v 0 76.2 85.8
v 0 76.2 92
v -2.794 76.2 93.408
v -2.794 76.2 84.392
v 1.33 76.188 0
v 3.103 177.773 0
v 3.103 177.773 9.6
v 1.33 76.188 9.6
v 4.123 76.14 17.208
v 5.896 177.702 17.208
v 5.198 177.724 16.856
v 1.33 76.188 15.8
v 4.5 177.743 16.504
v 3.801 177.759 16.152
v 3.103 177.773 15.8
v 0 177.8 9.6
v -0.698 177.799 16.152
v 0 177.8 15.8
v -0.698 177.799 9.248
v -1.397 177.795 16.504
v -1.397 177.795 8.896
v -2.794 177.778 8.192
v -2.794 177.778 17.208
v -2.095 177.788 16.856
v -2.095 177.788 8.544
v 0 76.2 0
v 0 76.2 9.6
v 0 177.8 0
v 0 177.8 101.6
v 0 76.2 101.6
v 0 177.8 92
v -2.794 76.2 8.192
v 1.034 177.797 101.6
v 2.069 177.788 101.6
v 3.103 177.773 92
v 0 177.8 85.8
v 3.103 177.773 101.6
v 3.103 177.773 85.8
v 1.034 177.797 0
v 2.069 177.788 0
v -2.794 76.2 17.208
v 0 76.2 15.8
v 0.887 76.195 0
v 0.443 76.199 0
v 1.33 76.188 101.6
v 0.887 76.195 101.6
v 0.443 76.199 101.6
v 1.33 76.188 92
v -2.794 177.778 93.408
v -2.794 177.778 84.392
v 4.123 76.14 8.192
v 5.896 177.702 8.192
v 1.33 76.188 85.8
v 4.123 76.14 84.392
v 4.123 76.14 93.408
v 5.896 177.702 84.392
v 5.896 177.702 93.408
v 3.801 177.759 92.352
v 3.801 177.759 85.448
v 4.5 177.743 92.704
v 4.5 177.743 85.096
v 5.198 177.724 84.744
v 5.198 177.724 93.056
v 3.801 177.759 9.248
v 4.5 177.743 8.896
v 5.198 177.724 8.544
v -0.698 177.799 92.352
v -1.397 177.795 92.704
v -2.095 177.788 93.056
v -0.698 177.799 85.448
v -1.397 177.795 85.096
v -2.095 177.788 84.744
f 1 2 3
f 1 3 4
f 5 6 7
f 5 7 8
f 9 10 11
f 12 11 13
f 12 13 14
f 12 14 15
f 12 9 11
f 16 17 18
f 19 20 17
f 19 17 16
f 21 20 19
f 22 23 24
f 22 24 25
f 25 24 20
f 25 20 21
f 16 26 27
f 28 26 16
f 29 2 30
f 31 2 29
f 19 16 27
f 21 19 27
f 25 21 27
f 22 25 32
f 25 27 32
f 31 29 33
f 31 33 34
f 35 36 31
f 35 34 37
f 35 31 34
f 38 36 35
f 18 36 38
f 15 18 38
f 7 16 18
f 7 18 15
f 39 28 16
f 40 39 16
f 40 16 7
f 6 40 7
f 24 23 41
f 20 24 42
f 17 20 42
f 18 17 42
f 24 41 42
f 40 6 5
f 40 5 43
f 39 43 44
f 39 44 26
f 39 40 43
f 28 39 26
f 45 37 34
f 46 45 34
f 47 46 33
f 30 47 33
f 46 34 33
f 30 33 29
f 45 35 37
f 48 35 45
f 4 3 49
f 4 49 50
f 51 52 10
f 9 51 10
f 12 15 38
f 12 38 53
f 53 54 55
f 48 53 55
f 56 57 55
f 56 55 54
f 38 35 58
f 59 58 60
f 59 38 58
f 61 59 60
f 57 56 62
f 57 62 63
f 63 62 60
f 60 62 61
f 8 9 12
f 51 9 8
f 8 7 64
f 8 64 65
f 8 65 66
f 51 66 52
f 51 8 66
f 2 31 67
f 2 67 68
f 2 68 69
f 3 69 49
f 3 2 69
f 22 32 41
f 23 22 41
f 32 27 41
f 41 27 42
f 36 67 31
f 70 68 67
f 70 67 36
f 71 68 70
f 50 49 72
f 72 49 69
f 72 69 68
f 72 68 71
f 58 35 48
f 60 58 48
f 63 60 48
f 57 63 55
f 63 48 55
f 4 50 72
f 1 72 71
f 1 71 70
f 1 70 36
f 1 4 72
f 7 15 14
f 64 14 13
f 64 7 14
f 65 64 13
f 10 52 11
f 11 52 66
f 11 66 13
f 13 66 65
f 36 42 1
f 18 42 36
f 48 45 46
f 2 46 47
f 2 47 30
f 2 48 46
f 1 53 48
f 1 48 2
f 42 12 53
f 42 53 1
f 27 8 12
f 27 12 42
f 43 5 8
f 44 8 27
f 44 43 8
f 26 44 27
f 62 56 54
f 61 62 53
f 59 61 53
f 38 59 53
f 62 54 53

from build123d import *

# Parameters (mm, degrees)
BOSS_EXTRUDE1_DEPTH      = 101.6
BOSS_EXTRUDE2_REACH      = 145.703
BOSS_EXTRUDE2_END_RADIUS = 177.8
BOSS_EXTRUDE3_REACH      = 145.805
BOSS_EXTRUDE3_END_RADIUS = 177.8


with BuildPart() as part:
    # Sketch1 → Boss-Extrude1 (new body)
    with BuildSketch(Plane.XY):
        with BuildLine():
            Line((0, 76.2), (0, 177.8))
            ThreePointArc((0, 177.8), (1.551578012, 177.793229921), (3.103037865, 177.772920199))
            Line((3.103037865, 177.772920199), (1.329873371, 76.188394371))
            ThreePointArc((1.329873371, 76.188394371), (0.664962005, 76.197098537), (0, 76.2))
        make_face()
    extrude(amount=BOSS_EXTRUDE1_DEPTH)

    # Boss-Extrude2: up to this cylinder (the profile starts inside it)
    boss_extrude2_end = Plane(origin=(0, 0, 50.8), z_dir=(0, 0, -1)) * Cylinder(BOSS_EXTRUDE2_END_RADIUS, 724.206, mode=Mode.PRIVATE)
    # Sketch2 → Boss-Extrude2 (add, up to the surface)
    with BuildSketch(Plane(origin=(1.329873371, 76.188394371, 0), x_dir=(0, 0, -1), z_dir=(-0.01745240643728355, -0.9998476951563914, 0)), mode=Mode.PRIVATE) as boss_extrude2_sk1:
        Polygon((-92.000208065, 0), (-93.4085, 2.794), (-84.3915, 2.794), (-85.799791935, 0), align=None)
    boss_extrude2_tool1 = extrude(boss_extrude2_sk1.sketch, amount=-BOSS_EXTRUDE2_REACH, mode=Mode.PRIVATE) & boss_extrude2_end
    add(boss_extrude2_tool1.solids().sort_by_distance((2.812837, 76.162509, 88.9))[0])
    # Sketch2 → Boss-Extrude2 (add, up to the surface)
    with BuildSketch(Plane(origin=(1.329873371, 76.188394371, 0), x_dir=(0, 0, -1), z_dir=(-0.01745240643728355, -0.9998476951563914, 0)), mode=Mode.PRIVATE) as boss_extrude2_sk2:
        Polygon((-15.800208065, 0), (-9.599791935, 0), (-8.1915, 2.794), (-17.2085, 2.794), align=None)
    boss_extrude2_tool2 = extrude(boss_extrude2_sk2.sketch, amount=-BOSS_EXTRUDE2_REACH, mode=Mode.PRIVATE) & boss_extrude2_end
    add(boss_extrude2_tool2.solids().sort_by_distance((2.812837, 76.162509, 12.7))[0])

    # Boss-Extrude3: up to this cylinder (the profile starts inside it)
    boss_extrude3_end = Plane(origin=(0, 0, 50.8), z_dir=(0, 0, -1)) * Cylinder(BOSS_EXTRUDE3_END_RADIUS, 724.41, mode=Mode.PRIVATE)
    # Sketch3 → Boss-Extrude3 (add, up to the surface)
    with BuildSketch(Plane(origin=(0, 76.2, 0), x_dir=(0, 0, -1), z_dir=(0, -1, 0)), mode=Mode.PRIVATE) as boss_extrude3_sk1:
        Polygon((-92.000208065, 0), (-93.4085, -2.79357446), (-84.3915, -2.79357446), (-85.799791935, 0), align=None)
    boss_extrude3_tool1 = extrude(boss_extrude3_sk1.sketch, amount=-BOSS_EXTRUDE3_REACH, mode=Mode.PRIVATE) & boss_extrude3_end
    add(boss_extrude3_tool1.solids().sort_by_distance((-1.482964, 76.2, 88.9))[0])
    # Sketch3 → Boss-Extrude3 (add, up to the surface)
    with BuildSketch(Plane(origin=(0, 76.2, 0), x_dir=(0, 0, -1), z_dir=(0, -1, 0)), mode=Mode.PRIVATE) as boss_extrude3_sk2:
        Polygon((-15.800208065, 0), (-9.599791935, 0), (-8.1915, -2.79357446), (-17.2085, -2.79357446), align=None)
    boss_extrude3_tool2 = extrude(boss_extrude3_sk2.sketch, amount=-BOSS_EXTRUDE3_REACH, mode=Mode.PRIVATE) & boss_extrude3_end
    add(boss_extrude3_tool2.solids().sort_by_distance((-1.482964, 76.2, 12.7))[0])


solid = part.part
